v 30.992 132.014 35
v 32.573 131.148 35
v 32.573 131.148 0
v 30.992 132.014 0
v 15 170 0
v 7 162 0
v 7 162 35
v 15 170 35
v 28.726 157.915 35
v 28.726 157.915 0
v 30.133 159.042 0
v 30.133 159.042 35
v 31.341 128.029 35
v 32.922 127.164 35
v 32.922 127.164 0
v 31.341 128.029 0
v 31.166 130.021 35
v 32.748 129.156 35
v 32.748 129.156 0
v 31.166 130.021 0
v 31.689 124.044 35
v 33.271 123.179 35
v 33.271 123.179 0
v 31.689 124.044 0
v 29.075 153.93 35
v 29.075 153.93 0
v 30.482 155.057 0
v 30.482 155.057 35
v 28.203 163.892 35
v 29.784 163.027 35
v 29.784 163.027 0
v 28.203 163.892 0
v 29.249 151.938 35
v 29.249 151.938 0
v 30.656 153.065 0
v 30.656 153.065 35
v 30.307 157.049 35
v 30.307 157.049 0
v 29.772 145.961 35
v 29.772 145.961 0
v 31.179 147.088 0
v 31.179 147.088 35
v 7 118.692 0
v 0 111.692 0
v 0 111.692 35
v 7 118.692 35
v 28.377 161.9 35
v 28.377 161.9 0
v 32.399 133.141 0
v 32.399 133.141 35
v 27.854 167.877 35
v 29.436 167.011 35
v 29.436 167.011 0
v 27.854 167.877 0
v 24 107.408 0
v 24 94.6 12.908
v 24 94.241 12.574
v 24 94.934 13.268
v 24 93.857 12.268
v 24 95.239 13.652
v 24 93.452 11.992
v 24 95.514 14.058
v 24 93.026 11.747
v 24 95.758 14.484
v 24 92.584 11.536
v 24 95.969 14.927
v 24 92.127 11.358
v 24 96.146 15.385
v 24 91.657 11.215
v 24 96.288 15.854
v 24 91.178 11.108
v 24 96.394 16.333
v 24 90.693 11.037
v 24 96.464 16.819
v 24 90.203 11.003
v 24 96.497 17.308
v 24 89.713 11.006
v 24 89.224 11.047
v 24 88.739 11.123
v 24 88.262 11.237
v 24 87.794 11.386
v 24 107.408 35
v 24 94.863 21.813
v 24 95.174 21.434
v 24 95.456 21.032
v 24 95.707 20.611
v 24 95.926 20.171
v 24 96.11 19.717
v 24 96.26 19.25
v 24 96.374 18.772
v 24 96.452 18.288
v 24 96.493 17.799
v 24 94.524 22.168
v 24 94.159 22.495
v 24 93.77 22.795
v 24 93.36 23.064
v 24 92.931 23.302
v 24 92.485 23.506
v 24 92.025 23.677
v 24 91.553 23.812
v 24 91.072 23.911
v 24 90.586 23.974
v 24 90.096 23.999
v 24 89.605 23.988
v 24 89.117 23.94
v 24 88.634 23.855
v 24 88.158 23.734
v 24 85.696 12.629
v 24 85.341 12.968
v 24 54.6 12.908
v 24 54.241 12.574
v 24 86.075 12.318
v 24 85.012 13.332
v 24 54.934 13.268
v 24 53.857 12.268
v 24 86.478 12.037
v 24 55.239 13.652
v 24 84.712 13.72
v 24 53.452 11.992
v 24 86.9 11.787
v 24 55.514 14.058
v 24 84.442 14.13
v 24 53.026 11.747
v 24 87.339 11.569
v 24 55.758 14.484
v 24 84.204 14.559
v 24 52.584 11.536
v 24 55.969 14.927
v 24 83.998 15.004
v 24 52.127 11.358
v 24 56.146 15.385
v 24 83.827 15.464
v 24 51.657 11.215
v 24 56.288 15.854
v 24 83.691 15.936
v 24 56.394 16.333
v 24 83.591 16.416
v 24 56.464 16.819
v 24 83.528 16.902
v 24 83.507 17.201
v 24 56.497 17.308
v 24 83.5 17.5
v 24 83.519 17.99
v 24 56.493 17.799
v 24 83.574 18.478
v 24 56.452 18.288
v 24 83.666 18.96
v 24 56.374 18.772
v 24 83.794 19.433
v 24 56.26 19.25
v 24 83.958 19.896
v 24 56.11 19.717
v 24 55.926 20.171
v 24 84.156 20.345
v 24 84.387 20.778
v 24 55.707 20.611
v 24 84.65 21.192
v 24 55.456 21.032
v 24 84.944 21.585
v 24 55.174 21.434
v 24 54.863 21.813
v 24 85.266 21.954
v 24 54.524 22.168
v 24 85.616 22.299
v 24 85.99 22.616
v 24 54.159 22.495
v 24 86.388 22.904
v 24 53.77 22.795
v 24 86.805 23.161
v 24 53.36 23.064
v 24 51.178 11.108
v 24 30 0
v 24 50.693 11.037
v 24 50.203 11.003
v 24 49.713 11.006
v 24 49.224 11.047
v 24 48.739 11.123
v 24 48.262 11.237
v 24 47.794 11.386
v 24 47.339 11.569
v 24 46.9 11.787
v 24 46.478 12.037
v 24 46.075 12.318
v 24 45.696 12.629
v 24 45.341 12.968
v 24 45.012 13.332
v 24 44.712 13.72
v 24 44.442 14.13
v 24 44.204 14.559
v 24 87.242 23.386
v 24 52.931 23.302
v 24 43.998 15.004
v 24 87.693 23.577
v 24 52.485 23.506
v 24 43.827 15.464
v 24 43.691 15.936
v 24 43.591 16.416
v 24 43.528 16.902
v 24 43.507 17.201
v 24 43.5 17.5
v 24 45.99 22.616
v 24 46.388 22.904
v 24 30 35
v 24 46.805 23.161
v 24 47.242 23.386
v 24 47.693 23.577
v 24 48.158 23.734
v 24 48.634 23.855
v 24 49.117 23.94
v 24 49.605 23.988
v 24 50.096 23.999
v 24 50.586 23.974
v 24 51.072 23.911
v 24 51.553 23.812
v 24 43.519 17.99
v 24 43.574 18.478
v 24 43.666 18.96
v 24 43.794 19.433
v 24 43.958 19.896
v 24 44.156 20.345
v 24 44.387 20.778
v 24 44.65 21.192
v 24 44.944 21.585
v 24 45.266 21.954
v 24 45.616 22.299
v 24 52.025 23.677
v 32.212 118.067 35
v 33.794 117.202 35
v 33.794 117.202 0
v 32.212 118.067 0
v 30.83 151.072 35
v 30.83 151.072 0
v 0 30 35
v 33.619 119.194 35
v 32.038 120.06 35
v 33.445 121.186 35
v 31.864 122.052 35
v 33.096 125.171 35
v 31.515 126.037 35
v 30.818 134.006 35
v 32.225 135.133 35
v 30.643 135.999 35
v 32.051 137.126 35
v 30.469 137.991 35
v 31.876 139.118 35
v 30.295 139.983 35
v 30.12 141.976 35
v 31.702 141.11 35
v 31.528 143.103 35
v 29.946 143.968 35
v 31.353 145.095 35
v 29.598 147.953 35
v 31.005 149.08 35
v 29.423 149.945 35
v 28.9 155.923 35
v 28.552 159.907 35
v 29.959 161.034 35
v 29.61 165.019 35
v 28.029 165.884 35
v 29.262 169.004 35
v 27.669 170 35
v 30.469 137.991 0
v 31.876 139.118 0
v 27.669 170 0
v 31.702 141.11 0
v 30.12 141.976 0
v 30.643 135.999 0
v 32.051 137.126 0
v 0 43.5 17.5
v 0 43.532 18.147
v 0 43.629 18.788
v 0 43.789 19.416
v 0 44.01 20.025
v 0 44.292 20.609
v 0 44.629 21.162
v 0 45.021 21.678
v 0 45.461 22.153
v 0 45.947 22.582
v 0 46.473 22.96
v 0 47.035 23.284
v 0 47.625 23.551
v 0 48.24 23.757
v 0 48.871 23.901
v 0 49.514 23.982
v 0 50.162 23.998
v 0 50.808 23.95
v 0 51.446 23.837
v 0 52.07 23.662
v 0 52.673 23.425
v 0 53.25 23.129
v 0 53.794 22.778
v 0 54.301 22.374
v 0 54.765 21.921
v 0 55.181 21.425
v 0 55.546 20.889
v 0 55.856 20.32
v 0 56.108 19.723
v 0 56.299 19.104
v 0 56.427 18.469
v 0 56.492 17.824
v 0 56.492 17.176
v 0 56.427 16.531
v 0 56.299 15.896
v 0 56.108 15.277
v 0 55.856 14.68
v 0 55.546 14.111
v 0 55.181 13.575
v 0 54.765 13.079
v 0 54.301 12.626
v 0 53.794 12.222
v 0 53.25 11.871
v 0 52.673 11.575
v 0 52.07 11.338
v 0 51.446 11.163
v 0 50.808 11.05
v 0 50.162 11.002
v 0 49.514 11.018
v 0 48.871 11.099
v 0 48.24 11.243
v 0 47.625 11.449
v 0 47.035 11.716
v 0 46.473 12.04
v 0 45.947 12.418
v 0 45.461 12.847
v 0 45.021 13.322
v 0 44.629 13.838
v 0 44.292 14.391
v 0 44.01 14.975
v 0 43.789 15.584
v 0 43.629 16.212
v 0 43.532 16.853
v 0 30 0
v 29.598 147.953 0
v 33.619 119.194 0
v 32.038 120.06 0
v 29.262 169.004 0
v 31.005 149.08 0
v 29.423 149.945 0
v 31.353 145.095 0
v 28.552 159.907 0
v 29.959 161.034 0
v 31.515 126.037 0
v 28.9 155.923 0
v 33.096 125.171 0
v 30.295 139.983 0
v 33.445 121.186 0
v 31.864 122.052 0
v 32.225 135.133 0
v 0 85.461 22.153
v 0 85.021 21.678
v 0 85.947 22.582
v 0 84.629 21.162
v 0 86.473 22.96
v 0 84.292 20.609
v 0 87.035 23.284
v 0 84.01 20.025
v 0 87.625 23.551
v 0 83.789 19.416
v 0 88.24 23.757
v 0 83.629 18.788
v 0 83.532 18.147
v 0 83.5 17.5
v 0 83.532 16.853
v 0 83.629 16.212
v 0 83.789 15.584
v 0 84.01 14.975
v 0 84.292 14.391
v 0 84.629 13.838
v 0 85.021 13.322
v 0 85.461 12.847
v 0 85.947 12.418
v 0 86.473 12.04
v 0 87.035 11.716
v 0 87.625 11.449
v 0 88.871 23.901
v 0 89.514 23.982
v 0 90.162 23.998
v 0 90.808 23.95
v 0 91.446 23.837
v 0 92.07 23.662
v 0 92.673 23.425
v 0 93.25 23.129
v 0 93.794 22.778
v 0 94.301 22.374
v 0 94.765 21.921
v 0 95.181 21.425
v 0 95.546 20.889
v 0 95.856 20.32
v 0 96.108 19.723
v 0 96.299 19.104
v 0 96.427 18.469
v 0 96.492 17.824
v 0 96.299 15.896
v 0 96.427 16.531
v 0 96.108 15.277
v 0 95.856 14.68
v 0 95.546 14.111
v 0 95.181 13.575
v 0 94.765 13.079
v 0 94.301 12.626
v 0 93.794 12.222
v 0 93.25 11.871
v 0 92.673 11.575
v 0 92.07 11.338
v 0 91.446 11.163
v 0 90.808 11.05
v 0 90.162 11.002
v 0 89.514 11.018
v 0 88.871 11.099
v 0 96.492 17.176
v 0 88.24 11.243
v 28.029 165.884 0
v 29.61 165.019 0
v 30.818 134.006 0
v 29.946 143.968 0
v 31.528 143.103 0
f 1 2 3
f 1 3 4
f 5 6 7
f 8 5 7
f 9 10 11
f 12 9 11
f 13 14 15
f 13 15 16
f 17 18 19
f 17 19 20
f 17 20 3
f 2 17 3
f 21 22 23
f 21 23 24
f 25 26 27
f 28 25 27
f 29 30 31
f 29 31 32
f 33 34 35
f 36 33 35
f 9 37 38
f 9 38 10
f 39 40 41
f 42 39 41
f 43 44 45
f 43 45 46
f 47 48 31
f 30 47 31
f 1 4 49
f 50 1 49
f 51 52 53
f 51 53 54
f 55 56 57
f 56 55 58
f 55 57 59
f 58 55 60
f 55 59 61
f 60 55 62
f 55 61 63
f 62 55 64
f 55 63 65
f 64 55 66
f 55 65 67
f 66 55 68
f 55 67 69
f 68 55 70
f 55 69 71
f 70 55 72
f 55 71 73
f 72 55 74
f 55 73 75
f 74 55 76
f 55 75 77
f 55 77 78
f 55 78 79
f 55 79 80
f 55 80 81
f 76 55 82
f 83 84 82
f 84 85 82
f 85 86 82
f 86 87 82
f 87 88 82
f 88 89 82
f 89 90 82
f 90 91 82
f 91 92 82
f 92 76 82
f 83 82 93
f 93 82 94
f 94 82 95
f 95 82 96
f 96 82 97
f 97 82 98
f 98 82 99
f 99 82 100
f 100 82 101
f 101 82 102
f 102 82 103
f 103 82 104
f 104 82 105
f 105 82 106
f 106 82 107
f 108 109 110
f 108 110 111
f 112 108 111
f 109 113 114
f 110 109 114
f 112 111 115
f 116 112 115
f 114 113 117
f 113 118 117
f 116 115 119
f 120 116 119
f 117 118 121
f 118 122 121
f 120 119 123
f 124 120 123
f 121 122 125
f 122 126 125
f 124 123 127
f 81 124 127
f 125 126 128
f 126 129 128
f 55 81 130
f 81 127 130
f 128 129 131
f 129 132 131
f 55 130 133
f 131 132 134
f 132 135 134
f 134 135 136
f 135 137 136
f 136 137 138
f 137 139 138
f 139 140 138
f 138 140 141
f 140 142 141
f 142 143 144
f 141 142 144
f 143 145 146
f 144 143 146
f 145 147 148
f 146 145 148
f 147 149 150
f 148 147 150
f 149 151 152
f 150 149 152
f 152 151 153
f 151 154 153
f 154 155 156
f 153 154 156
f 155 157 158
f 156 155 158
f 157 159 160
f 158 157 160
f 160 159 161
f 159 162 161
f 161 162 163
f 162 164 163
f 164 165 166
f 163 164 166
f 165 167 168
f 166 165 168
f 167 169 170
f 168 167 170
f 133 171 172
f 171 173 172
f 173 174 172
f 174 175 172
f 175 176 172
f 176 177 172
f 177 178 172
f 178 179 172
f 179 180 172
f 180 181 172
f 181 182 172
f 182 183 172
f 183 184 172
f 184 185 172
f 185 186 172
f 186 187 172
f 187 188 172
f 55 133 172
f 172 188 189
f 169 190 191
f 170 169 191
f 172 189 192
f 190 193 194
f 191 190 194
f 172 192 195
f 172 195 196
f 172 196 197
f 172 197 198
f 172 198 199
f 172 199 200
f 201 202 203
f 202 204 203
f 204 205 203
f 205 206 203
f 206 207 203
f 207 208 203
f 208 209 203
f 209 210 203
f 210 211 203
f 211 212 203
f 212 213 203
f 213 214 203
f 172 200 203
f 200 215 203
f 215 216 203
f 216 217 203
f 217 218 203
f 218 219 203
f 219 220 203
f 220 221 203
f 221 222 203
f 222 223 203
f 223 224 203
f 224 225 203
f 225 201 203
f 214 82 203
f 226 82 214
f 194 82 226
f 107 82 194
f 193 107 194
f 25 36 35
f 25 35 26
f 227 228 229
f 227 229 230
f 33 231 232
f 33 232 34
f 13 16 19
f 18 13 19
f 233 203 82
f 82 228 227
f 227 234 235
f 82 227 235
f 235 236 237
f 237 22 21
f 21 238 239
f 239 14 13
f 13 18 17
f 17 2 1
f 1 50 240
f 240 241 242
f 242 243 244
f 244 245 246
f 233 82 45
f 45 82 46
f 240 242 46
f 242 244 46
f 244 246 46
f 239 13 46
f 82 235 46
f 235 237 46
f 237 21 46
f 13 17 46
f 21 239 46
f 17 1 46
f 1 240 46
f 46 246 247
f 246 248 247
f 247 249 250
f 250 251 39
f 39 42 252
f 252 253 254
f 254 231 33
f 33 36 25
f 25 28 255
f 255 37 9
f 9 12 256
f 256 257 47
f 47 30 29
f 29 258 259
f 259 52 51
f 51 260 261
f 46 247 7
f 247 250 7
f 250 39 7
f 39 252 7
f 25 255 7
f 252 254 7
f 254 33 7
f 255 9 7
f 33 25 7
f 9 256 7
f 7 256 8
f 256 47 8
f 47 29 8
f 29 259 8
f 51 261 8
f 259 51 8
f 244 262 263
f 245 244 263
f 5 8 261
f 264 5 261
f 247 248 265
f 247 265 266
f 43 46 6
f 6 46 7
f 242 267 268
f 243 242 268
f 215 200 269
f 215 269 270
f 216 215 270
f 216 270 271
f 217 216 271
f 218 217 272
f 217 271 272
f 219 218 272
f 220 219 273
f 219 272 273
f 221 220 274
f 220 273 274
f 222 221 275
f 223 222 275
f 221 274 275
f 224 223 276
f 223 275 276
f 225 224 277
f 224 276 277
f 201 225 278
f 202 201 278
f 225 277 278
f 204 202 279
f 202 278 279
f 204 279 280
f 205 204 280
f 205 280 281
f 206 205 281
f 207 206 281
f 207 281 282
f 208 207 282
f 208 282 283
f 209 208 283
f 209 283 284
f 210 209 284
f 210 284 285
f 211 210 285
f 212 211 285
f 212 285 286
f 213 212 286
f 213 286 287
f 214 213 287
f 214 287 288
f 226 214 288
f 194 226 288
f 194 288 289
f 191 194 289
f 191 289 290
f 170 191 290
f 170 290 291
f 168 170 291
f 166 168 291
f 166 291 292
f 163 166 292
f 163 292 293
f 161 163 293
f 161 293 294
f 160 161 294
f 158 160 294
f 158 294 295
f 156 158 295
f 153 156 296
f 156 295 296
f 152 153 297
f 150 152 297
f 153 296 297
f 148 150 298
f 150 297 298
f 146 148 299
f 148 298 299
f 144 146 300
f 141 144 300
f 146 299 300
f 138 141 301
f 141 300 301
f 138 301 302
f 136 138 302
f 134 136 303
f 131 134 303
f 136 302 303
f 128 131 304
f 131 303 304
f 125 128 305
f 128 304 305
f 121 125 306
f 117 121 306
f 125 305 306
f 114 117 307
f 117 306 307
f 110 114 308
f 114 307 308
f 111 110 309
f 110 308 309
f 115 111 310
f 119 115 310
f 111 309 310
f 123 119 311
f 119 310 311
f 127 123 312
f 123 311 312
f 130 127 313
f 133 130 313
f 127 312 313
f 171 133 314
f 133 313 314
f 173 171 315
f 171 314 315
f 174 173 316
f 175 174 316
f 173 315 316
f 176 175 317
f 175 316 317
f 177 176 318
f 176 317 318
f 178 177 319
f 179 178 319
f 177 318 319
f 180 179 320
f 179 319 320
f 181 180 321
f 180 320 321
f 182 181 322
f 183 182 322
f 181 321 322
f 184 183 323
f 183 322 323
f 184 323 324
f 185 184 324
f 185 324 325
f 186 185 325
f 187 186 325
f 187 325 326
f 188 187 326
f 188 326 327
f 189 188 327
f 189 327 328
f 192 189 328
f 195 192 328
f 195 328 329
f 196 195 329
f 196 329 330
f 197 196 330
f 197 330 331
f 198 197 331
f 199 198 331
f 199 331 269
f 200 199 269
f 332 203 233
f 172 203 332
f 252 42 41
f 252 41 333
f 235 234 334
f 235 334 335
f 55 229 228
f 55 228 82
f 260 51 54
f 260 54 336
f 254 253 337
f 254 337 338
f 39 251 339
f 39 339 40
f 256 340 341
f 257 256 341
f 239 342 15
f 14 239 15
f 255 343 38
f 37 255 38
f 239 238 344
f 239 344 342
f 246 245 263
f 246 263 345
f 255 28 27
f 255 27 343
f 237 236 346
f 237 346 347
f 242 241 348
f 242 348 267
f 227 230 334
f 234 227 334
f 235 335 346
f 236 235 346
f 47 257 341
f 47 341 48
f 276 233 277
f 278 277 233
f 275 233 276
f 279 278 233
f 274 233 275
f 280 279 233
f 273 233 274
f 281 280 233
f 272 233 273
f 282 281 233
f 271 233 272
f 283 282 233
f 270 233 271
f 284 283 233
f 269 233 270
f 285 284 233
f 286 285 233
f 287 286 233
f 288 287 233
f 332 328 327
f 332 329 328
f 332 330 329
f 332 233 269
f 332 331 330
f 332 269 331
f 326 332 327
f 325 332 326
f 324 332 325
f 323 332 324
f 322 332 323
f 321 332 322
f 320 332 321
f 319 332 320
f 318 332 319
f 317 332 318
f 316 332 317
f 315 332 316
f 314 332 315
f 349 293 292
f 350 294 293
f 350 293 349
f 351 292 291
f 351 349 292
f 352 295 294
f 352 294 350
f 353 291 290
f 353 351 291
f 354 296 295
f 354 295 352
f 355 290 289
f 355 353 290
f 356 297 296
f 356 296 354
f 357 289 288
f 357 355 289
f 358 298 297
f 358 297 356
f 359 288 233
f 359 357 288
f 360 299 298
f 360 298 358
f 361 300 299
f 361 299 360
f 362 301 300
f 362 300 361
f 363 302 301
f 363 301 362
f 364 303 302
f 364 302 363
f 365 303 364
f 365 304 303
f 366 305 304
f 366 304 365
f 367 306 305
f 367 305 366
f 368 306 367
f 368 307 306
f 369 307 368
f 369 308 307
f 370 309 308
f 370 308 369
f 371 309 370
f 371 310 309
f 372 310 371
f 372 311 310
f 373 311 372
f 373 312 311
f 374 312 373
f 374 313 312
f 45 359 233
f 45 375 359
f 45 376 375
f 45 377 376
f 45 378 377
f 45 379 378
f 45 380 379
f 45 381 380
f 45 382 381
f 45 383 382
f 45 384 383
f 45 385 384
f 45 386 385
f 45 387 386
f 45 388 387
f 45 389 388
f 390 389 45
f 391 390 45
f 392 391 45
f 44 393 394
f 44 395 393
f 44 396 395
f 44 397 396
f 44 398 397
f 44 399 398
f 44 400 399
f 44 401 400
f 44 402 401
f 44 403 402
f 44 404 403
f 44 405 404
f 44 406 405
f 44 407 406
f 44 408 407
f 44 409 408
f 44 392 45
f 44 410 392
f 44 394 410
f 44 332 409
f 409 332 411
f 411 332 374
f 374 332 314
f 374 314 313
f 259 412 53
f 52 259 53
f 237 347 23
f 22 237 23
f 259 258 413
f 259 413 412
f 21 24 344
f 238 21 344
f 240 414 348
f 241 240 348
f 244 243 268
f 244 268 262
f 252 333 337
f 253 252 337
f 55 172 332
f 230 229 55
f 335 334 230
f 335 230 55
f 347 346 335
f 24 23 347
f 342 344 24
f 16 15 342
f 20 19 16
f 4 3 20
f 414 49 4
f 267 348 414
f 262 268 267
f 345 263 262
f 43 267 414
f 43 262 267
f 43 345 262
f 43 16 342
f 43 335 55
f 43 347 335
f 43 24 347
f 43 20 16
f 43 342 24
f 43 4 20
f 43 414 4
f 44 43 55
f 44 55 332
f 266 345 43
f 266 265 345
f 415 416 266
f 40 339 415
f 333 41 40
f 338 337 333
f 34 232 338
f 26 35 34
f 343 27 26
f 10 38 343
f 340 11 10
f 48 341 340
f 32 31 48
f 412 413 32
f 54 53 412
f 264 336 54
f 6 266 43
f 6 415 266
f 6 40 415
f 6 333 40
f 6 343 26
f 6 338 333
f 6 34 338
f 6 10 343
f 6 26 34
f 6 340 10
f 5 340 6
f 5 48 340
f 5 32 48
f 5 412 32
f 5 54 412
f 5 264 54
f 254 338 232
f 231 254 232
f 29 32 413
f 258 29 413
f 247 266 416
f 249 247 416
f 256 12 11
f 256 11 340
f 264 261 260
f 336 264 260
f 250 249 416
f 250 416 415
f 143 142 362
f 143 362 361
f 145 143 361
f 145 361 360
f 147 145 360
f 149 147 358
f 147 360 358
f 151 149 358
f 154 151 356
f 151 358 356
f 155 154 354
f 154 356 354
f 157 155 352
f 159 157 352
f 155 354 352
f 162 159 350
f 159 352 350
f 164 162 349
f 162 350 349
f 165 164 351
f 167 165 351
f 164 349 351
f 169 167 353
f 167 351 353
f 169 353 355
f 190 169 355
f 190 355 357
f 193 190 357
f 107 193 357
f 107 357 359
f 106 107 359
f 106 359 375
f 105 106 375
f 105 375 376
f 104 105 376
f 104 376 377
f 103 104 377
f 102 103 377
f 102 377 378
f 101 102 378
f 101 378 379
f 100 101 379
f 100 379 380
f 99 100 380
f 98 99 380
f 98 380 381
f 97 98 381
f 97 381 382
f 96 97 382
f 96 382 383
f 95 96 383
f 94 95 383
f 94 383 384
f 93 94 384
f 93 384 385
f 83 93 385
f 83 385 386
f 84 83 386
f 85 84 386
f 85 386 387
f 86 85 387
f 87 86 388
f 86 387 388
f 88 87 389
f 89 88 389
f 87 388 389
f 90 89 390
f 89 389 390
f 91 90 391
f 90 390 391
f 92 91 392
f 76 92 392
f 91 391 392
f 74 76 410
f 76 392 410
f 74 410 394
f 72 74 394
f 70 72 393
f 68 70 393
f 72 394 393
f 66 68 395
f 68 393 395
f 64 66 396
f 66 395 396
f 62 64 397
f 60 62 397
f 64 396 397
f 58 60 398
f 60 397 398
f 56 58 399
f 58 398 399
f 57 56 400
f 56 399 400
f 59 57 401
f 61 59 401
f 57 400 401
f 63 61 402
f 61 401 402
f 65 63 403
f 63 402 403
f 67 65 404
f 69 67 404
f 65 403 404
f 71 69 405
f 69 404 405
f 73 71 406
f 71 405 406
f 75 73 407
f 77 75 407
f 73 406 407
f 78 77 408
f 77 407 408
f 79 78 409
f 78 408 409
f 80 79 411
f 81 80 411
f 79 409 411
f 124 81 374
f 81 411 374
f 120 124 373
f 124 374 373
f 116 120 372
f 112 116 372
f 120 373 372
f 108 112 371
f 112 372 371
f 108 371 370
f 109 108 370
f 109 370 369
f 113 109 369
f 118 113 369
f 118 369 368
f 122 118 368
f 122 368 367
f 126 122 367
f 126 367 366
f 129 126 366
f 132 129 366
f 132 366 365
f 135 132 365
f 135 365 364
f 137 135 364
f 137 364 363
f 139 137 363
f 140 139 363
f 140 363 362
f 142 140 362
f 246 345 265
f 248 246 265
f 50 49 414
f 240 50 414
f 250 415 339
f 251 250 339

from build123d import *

# Parameters (mm, degrees)
EXTRUDE_1_DEPTH        = 35
CUT_EXTRUDE_28_DEPTH   = 49
CUT_EXTRUDE_29_DEPTH   = 178.259696491
CUT_EXTRUDE_30_DEPTH   = 49
PATTERN_LINEAR_1_COUNT = 26
PATTERN_LINEAR_1_PITCH = 2
CHAMFER_2_SIZE         = 3.4
SKETCH_54_W            = 35
SKETCH_54_H            = 30
CUT_EXTRUDE_33_DEPTH   = 50
CUT_EXTRUDE_34_DEPTH   = 110
CHAMFER_3_SIZE         = 15
SKETCH_61_R            = 6.5
CUT_EXTRUDE_37_DEPTH   = 100
CUT_EXTRUDE_38_DEPTH   = 177.82480109
CUT_EXTRUDE_39_DEPTH   = 177.82480109


with BuildPart() as part:
    # 草图48 → 拉伸1 (new body)
    with BuildSketch(Plane.XY):
        Polygon((34.1, 110), (36, 110), (36, 0), (0, 0), (-0.0001, 170), (34.1, 170), (34.1, 144.543002638), align=None)
    extrude(amount=EXTRUDE_1_DEPTH)

    # 草图49 → 切除-拉伸28 (cut)
    with BuildSketch(Plane.XY.offset(35)):
        Polygon((34.1, 113.69999995), (29.174388239, 170), (34.1, 170), align=None)
    extrude(amount=-CUT_EXTRUDE_28_DEPTH, mode=Mode.SUBTRACT)

    # 草图50 → 切除-拉伸29 (cut, through all)
    with BuildSketch(Plane.XY.offset(35)):
        Polygon((27.668658483, 170), (29.261543982, 169.003805302), (29.174388239, 170), align=None)
    extrude(amount=-CUT_EXTRUDE_29_DEPTH, mode=Mode.SUBTRACT)

    # 草图51 → 切除-拉伸30 (cut)
    with BuildSketch(Plane.XY.offset(35)):
        Polygon((27.854407685, 167.876876901), (29.261543982, 169.003805302), (29.435855467, 167.011415906), align=None)
    cut_extrude_30 = extrude(amount=-CUT_EXTRUDE_30_DEPTH, mode=Mode.SUBTRACT)

    # 阵列(线性)1: 切除-拉伸30 ×26
    with Locations(*[Vector(0.08715574274765898, -0.9961946980917455, 0) * (i * PATTERN_LINEAR_1_PITCH) for i in range(1, PATTERN_LINEAR_1_COUNT)]):
        add(cut_extrude_30, mode=Mode.SUBTRACT)

    # 倒角2
    # the kernel refuses this chamfer: 3.4 mm, written as the material it takes off along each edge
    with BuildSketch(Plane(origin=(36, 110, -8.743722159), x_dir=(-0.9996219169112966, 0.027495876610587885, 0), z_dir=(0, 0, 1))) as chamfer_2_piece_1_section:
        Polygon((CHAMFER_2_SIZE * 0.999621916911, CHAMFER_2_SIZE * 0.0274958766106), (-CHAMFER_2_SIZE * 0.0274958766106, CHAMFER_2_SIZE * 0.999621916911), (0, 0), align=None)
    chamfer_2_piece_1 = extrude(amount=52.487444318, mode=Mode.PRIVATE)
    chamfer_2_piece_1 = split(chamfer_2_piece_1, bisect_by=Plane(origin=(34.1, 108.700122697, 17.5), z_dir=(1, 0, 0)), keep=Keep.TOP, mode=Mode.PRIVATE)
    add(chamfer_2_piece_1, mode=Mode.SUBTRACT)

    # 草图54 → 切除-拉伸33 (cut)
    with BuildSketch(Plane(origin=(36, 0, 0), x_dir=(0, 0, -1), z_dir=(1, 0, 0))):
        with Locations((-17.5, 15)):
            Rectangle(SKETCH_54_W, SKETCH_54_H)
    extrude(amount=-CUT_EXTRUDE_33_DEPTH, mode=Mode.SUBTRACT)

    # 草图56 → 切除-拉伸34 (cut)
    with BuildSketch(Plane.XY.offset(35)):
        Polygon((29, 106.6), (33.793642605, 117.201681001), (59.324325826, 70.82967178), (36, 30), (29, 30), align=None)
    extrude(amount=-CUT_EXTRUDE_34_DEPTH, mode=Mode.SUBTRACT)

    # 倒角3
    chamfer_3_edges = [part.edges().sort_by_distance(p)[0] for p in [
        (-0.0001, 170, 17.5),
    ]]
    chamfer(chamfer_3_edges, length=CHAMFER_3_SIZE)

    # 草图61 → 切除-拉伸37 (cut)
    with BuildSketch(Plane(origin=(0, 0, 0), x_dir=(0, 0, 1), z_dir=(-0.9999999999998271, -5.882352941191543e-07, 0))):
        with Locations(Location((17.5, 50, 0), (0, 0, 270))):
            Circle(SKETCH_61_R)
        with Locations(Location((17.5, 90, 0), (0, 0, 270))):
            Circle(SKETCH_61_R)
    extrude(amount=-CUT_EXTRUDE_37_DEPTH, mode=Mode.SUBTRACT)

    # 草图62 → 切除-拉伸38 (cut, through all)
    with BuildSketch(Plane.XY.offset(35)):
        Polygon((33.793642605, 117.201681001), (24, 107.408038396), (24, 30), (29, 30), (29, 106.6), align=None)
    extrude(amount=-CUT_EXTRUDE_38_DEPTH, mode=Mode.SUBTRACT)

    # 草图63 → 切除-拉伸39 (cut, through all)
    with BuildSketch(Plane.XY.offset(35)):
        Polygon((-6.5701e-05, 111.692243943), (6.999930181, 118.692239825), (6.999930181, 179.62094854), (-6.5701e-05, 176.661572218), (-12.74320746, 177.391313792), (-12.74320746, 111.692243943), align=None)
    extrude(amount=-CUT_EXTRUDE_39_DEPTH, mode=Mode.SUBTRACT)


solid = part.part
